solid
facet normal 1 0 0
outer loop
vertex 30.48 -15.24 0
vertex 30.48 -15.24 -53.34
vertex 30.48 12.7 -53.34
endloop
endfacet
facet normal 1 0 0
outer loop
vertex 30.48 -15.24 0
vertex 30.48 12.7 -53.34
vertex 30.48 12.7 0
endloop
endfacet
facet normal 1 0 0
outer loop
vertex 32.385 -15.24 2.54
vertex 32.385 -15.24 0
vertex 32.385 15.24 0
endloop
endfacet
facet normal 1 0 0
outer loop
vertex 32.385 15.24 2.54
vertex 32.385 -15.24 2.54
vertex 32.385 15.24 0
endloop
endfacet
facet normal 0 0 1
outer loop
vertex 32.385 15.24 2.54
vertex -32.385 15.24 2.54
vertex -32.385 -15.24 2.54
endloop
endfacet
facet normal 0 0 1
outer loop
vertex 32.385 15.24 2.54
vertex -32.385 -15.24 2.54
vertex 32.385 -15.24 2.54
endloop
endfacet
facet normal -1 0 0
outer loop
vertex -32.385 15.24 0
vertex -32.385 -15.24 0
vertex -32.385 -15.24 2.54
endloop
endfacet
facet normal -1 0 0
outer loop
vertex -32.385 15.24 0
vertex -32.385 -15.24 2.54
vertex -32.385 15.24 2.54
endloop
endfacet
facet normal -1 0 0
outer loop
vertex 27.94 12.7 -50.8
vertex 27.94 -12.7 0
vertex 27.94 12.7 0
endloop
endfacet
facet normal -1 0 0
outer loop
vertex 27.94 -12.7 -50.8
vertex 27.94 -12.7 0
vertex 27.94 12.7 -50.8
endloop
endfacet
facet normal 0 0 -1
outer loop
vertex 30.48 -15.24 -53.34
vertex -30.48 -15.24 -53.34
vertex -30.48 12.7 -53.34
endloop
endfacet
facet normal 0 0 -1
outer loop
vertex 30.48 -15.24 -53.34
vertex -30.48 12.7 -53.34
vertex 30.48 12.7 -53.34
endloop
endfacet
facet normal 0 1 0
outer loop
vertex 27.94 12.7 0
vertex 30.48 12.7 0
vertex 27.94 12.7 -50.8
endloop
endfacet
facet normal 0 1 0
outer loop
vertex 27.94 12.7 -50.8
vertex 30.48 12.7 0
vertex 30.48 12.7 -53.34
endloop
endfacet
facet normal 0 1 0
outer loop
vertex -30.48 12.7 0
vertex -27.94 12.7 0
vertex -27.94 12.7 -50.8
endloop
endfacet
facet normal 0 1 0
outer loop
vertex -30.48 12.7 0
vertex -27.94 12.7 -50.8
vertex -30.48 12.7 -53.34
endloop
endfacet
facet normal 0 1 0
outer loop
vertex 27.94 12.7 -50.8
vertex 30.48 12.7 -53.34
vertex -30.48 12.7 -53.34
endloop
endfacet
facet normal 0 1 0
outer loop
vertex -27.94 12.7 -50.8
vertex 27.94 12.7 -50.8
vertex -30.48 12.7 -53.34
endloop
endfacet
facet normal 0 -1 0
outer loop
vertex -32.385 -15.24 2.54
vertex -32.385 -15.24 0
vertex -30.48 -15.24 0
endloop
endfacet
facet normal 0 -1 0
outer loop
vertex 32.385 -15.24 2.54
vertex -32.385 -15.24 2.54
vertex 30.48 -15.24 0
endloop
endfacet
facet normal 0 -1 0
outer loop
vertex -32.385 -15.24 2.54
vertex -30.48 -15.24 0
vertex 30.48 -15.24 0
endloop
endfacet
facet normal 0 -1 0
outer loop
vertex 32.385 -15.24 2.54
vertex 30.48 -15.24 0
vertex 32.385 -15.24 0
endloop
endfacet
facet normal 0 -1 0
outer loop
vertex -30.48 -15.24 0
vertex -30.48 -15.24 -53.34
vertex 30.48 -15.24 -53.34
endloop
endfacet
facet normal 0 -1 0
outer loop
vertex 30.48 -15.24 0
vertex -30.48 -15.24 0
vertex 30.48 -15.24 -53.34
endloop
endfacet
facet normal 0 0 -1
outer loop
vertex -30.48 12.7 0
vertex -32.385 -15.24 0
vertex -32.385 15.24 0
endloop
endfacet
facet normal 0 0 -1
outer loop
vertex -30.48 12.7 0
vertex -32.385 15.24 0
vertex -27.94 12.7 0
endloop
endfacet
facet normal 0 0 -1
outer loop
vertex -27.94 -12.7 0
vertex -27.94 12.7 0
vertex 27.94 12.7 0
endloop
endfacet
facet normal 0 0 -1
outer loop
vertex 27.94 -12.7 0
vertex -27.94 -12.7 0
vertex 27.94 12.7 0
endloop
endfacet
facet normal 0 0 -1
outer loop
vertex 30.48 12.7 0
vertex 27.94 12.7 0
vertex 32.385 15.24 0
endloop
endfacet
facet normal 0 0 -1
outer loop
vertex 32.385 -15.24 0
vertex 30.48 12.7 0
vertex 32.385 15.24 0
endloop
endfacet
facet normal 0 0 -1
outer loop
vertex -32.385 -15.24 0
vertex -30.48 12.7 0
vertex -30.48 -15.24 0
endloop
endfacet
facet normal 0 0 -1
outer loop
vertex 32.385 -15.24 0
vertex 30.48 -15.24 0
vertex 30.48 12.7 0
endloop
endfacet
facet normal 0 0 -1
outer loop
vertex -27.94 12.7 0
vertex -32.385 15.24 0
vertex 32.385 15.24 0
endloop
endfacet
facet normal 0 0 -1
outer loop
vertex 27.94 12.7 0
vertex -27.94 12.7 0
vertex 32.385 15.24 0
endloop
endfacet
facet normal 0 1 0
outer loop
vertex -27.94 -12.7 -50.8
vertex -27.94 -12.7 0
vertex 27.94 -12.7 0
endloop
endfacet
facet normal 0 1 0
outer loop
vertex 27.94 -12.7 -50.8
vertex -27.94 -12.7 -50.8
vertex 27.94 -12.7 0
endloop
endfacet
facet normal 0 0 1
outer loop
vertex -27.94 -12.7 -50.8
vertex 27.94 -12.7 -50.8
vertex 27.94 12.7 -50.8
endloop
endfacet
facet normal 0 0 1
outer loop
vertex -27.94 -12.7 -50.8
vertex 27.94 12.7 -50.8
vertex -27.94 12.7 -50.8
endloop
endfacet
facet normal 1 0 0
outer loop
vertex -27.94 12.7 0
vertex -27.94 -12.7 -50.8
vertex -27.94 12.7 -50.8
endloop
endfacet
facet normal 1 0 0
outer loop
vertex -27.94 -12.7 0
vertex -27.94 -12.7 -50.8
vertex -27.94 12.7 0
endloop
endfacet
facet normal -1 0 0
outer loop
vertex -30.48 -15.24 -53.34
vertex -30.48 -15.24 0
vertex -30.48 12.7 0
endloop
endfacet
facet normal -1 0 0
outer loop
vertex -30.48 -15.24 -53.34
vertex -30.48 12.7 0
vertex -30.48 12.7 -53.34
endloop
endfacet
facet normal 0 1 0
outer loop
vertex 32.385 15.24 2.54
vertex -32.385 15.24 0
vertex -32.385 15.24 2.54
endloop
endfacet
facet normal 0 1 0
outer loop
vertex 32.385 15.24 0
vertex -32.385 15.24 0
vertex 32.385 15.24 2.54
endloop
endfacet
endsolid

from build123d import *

# Parameters (mm, degrees)
SKETCH1_W           = 64.77
SKETCH1_H           = 30.48
BOSS_EXTRUDE1_DEPTH = 2.54
SKETCH2_W           = 60.96
SKETCH2_H           = 53.34
BOSS_EXTRUDE2_DEPTH = 2.54
BOSS_EXTRUDE4_DEPTH = 25.4


with BuildPart() as part:
    # Sketch1 → Boss-Extrude1 (new body)
    with BuildSketch(Plane.XY):
        Rectangle(SKETCH1_W, SKETCH1_H)
    extrude(amount=BOSS_EXTRUDE1_DEPTH)



with BuildPart() as body_2:
    # Sketch2 → Boss-Extrude2 (new body)
    with BuildSketch(Plane.XZ.offset(15.24)):
        with Locations((0, -26.67)):
            Rectangle(SKETCH2_W, SKETCH2_H)
    extrude(amount=-BOSS_EXTRUDE2_DEPTH)


with BuildPart() as part_1:
    add(part.part)

    add(body_2.part)  # Boss-Extrude4 merges body 2
    # Sketch3 → Boss-Extrude4 (add)
    with BuildSketch(Plane(origin=(0, -12.7, 0), x_dir=(-1, 0, 0), z_dir=(0, -1, 0))):
        Polygon((27.94, 50.8), (27.94, 0), (30.48, 0), (30.48, 53.34), (-30.48, 53.34), (-30.48, 0), (-27.94, 0), (-27.94, 50.8), align=None)
    extrude(amount=-BOSS_EXTRUDE4_DEPTH)


solid = part_1.part
